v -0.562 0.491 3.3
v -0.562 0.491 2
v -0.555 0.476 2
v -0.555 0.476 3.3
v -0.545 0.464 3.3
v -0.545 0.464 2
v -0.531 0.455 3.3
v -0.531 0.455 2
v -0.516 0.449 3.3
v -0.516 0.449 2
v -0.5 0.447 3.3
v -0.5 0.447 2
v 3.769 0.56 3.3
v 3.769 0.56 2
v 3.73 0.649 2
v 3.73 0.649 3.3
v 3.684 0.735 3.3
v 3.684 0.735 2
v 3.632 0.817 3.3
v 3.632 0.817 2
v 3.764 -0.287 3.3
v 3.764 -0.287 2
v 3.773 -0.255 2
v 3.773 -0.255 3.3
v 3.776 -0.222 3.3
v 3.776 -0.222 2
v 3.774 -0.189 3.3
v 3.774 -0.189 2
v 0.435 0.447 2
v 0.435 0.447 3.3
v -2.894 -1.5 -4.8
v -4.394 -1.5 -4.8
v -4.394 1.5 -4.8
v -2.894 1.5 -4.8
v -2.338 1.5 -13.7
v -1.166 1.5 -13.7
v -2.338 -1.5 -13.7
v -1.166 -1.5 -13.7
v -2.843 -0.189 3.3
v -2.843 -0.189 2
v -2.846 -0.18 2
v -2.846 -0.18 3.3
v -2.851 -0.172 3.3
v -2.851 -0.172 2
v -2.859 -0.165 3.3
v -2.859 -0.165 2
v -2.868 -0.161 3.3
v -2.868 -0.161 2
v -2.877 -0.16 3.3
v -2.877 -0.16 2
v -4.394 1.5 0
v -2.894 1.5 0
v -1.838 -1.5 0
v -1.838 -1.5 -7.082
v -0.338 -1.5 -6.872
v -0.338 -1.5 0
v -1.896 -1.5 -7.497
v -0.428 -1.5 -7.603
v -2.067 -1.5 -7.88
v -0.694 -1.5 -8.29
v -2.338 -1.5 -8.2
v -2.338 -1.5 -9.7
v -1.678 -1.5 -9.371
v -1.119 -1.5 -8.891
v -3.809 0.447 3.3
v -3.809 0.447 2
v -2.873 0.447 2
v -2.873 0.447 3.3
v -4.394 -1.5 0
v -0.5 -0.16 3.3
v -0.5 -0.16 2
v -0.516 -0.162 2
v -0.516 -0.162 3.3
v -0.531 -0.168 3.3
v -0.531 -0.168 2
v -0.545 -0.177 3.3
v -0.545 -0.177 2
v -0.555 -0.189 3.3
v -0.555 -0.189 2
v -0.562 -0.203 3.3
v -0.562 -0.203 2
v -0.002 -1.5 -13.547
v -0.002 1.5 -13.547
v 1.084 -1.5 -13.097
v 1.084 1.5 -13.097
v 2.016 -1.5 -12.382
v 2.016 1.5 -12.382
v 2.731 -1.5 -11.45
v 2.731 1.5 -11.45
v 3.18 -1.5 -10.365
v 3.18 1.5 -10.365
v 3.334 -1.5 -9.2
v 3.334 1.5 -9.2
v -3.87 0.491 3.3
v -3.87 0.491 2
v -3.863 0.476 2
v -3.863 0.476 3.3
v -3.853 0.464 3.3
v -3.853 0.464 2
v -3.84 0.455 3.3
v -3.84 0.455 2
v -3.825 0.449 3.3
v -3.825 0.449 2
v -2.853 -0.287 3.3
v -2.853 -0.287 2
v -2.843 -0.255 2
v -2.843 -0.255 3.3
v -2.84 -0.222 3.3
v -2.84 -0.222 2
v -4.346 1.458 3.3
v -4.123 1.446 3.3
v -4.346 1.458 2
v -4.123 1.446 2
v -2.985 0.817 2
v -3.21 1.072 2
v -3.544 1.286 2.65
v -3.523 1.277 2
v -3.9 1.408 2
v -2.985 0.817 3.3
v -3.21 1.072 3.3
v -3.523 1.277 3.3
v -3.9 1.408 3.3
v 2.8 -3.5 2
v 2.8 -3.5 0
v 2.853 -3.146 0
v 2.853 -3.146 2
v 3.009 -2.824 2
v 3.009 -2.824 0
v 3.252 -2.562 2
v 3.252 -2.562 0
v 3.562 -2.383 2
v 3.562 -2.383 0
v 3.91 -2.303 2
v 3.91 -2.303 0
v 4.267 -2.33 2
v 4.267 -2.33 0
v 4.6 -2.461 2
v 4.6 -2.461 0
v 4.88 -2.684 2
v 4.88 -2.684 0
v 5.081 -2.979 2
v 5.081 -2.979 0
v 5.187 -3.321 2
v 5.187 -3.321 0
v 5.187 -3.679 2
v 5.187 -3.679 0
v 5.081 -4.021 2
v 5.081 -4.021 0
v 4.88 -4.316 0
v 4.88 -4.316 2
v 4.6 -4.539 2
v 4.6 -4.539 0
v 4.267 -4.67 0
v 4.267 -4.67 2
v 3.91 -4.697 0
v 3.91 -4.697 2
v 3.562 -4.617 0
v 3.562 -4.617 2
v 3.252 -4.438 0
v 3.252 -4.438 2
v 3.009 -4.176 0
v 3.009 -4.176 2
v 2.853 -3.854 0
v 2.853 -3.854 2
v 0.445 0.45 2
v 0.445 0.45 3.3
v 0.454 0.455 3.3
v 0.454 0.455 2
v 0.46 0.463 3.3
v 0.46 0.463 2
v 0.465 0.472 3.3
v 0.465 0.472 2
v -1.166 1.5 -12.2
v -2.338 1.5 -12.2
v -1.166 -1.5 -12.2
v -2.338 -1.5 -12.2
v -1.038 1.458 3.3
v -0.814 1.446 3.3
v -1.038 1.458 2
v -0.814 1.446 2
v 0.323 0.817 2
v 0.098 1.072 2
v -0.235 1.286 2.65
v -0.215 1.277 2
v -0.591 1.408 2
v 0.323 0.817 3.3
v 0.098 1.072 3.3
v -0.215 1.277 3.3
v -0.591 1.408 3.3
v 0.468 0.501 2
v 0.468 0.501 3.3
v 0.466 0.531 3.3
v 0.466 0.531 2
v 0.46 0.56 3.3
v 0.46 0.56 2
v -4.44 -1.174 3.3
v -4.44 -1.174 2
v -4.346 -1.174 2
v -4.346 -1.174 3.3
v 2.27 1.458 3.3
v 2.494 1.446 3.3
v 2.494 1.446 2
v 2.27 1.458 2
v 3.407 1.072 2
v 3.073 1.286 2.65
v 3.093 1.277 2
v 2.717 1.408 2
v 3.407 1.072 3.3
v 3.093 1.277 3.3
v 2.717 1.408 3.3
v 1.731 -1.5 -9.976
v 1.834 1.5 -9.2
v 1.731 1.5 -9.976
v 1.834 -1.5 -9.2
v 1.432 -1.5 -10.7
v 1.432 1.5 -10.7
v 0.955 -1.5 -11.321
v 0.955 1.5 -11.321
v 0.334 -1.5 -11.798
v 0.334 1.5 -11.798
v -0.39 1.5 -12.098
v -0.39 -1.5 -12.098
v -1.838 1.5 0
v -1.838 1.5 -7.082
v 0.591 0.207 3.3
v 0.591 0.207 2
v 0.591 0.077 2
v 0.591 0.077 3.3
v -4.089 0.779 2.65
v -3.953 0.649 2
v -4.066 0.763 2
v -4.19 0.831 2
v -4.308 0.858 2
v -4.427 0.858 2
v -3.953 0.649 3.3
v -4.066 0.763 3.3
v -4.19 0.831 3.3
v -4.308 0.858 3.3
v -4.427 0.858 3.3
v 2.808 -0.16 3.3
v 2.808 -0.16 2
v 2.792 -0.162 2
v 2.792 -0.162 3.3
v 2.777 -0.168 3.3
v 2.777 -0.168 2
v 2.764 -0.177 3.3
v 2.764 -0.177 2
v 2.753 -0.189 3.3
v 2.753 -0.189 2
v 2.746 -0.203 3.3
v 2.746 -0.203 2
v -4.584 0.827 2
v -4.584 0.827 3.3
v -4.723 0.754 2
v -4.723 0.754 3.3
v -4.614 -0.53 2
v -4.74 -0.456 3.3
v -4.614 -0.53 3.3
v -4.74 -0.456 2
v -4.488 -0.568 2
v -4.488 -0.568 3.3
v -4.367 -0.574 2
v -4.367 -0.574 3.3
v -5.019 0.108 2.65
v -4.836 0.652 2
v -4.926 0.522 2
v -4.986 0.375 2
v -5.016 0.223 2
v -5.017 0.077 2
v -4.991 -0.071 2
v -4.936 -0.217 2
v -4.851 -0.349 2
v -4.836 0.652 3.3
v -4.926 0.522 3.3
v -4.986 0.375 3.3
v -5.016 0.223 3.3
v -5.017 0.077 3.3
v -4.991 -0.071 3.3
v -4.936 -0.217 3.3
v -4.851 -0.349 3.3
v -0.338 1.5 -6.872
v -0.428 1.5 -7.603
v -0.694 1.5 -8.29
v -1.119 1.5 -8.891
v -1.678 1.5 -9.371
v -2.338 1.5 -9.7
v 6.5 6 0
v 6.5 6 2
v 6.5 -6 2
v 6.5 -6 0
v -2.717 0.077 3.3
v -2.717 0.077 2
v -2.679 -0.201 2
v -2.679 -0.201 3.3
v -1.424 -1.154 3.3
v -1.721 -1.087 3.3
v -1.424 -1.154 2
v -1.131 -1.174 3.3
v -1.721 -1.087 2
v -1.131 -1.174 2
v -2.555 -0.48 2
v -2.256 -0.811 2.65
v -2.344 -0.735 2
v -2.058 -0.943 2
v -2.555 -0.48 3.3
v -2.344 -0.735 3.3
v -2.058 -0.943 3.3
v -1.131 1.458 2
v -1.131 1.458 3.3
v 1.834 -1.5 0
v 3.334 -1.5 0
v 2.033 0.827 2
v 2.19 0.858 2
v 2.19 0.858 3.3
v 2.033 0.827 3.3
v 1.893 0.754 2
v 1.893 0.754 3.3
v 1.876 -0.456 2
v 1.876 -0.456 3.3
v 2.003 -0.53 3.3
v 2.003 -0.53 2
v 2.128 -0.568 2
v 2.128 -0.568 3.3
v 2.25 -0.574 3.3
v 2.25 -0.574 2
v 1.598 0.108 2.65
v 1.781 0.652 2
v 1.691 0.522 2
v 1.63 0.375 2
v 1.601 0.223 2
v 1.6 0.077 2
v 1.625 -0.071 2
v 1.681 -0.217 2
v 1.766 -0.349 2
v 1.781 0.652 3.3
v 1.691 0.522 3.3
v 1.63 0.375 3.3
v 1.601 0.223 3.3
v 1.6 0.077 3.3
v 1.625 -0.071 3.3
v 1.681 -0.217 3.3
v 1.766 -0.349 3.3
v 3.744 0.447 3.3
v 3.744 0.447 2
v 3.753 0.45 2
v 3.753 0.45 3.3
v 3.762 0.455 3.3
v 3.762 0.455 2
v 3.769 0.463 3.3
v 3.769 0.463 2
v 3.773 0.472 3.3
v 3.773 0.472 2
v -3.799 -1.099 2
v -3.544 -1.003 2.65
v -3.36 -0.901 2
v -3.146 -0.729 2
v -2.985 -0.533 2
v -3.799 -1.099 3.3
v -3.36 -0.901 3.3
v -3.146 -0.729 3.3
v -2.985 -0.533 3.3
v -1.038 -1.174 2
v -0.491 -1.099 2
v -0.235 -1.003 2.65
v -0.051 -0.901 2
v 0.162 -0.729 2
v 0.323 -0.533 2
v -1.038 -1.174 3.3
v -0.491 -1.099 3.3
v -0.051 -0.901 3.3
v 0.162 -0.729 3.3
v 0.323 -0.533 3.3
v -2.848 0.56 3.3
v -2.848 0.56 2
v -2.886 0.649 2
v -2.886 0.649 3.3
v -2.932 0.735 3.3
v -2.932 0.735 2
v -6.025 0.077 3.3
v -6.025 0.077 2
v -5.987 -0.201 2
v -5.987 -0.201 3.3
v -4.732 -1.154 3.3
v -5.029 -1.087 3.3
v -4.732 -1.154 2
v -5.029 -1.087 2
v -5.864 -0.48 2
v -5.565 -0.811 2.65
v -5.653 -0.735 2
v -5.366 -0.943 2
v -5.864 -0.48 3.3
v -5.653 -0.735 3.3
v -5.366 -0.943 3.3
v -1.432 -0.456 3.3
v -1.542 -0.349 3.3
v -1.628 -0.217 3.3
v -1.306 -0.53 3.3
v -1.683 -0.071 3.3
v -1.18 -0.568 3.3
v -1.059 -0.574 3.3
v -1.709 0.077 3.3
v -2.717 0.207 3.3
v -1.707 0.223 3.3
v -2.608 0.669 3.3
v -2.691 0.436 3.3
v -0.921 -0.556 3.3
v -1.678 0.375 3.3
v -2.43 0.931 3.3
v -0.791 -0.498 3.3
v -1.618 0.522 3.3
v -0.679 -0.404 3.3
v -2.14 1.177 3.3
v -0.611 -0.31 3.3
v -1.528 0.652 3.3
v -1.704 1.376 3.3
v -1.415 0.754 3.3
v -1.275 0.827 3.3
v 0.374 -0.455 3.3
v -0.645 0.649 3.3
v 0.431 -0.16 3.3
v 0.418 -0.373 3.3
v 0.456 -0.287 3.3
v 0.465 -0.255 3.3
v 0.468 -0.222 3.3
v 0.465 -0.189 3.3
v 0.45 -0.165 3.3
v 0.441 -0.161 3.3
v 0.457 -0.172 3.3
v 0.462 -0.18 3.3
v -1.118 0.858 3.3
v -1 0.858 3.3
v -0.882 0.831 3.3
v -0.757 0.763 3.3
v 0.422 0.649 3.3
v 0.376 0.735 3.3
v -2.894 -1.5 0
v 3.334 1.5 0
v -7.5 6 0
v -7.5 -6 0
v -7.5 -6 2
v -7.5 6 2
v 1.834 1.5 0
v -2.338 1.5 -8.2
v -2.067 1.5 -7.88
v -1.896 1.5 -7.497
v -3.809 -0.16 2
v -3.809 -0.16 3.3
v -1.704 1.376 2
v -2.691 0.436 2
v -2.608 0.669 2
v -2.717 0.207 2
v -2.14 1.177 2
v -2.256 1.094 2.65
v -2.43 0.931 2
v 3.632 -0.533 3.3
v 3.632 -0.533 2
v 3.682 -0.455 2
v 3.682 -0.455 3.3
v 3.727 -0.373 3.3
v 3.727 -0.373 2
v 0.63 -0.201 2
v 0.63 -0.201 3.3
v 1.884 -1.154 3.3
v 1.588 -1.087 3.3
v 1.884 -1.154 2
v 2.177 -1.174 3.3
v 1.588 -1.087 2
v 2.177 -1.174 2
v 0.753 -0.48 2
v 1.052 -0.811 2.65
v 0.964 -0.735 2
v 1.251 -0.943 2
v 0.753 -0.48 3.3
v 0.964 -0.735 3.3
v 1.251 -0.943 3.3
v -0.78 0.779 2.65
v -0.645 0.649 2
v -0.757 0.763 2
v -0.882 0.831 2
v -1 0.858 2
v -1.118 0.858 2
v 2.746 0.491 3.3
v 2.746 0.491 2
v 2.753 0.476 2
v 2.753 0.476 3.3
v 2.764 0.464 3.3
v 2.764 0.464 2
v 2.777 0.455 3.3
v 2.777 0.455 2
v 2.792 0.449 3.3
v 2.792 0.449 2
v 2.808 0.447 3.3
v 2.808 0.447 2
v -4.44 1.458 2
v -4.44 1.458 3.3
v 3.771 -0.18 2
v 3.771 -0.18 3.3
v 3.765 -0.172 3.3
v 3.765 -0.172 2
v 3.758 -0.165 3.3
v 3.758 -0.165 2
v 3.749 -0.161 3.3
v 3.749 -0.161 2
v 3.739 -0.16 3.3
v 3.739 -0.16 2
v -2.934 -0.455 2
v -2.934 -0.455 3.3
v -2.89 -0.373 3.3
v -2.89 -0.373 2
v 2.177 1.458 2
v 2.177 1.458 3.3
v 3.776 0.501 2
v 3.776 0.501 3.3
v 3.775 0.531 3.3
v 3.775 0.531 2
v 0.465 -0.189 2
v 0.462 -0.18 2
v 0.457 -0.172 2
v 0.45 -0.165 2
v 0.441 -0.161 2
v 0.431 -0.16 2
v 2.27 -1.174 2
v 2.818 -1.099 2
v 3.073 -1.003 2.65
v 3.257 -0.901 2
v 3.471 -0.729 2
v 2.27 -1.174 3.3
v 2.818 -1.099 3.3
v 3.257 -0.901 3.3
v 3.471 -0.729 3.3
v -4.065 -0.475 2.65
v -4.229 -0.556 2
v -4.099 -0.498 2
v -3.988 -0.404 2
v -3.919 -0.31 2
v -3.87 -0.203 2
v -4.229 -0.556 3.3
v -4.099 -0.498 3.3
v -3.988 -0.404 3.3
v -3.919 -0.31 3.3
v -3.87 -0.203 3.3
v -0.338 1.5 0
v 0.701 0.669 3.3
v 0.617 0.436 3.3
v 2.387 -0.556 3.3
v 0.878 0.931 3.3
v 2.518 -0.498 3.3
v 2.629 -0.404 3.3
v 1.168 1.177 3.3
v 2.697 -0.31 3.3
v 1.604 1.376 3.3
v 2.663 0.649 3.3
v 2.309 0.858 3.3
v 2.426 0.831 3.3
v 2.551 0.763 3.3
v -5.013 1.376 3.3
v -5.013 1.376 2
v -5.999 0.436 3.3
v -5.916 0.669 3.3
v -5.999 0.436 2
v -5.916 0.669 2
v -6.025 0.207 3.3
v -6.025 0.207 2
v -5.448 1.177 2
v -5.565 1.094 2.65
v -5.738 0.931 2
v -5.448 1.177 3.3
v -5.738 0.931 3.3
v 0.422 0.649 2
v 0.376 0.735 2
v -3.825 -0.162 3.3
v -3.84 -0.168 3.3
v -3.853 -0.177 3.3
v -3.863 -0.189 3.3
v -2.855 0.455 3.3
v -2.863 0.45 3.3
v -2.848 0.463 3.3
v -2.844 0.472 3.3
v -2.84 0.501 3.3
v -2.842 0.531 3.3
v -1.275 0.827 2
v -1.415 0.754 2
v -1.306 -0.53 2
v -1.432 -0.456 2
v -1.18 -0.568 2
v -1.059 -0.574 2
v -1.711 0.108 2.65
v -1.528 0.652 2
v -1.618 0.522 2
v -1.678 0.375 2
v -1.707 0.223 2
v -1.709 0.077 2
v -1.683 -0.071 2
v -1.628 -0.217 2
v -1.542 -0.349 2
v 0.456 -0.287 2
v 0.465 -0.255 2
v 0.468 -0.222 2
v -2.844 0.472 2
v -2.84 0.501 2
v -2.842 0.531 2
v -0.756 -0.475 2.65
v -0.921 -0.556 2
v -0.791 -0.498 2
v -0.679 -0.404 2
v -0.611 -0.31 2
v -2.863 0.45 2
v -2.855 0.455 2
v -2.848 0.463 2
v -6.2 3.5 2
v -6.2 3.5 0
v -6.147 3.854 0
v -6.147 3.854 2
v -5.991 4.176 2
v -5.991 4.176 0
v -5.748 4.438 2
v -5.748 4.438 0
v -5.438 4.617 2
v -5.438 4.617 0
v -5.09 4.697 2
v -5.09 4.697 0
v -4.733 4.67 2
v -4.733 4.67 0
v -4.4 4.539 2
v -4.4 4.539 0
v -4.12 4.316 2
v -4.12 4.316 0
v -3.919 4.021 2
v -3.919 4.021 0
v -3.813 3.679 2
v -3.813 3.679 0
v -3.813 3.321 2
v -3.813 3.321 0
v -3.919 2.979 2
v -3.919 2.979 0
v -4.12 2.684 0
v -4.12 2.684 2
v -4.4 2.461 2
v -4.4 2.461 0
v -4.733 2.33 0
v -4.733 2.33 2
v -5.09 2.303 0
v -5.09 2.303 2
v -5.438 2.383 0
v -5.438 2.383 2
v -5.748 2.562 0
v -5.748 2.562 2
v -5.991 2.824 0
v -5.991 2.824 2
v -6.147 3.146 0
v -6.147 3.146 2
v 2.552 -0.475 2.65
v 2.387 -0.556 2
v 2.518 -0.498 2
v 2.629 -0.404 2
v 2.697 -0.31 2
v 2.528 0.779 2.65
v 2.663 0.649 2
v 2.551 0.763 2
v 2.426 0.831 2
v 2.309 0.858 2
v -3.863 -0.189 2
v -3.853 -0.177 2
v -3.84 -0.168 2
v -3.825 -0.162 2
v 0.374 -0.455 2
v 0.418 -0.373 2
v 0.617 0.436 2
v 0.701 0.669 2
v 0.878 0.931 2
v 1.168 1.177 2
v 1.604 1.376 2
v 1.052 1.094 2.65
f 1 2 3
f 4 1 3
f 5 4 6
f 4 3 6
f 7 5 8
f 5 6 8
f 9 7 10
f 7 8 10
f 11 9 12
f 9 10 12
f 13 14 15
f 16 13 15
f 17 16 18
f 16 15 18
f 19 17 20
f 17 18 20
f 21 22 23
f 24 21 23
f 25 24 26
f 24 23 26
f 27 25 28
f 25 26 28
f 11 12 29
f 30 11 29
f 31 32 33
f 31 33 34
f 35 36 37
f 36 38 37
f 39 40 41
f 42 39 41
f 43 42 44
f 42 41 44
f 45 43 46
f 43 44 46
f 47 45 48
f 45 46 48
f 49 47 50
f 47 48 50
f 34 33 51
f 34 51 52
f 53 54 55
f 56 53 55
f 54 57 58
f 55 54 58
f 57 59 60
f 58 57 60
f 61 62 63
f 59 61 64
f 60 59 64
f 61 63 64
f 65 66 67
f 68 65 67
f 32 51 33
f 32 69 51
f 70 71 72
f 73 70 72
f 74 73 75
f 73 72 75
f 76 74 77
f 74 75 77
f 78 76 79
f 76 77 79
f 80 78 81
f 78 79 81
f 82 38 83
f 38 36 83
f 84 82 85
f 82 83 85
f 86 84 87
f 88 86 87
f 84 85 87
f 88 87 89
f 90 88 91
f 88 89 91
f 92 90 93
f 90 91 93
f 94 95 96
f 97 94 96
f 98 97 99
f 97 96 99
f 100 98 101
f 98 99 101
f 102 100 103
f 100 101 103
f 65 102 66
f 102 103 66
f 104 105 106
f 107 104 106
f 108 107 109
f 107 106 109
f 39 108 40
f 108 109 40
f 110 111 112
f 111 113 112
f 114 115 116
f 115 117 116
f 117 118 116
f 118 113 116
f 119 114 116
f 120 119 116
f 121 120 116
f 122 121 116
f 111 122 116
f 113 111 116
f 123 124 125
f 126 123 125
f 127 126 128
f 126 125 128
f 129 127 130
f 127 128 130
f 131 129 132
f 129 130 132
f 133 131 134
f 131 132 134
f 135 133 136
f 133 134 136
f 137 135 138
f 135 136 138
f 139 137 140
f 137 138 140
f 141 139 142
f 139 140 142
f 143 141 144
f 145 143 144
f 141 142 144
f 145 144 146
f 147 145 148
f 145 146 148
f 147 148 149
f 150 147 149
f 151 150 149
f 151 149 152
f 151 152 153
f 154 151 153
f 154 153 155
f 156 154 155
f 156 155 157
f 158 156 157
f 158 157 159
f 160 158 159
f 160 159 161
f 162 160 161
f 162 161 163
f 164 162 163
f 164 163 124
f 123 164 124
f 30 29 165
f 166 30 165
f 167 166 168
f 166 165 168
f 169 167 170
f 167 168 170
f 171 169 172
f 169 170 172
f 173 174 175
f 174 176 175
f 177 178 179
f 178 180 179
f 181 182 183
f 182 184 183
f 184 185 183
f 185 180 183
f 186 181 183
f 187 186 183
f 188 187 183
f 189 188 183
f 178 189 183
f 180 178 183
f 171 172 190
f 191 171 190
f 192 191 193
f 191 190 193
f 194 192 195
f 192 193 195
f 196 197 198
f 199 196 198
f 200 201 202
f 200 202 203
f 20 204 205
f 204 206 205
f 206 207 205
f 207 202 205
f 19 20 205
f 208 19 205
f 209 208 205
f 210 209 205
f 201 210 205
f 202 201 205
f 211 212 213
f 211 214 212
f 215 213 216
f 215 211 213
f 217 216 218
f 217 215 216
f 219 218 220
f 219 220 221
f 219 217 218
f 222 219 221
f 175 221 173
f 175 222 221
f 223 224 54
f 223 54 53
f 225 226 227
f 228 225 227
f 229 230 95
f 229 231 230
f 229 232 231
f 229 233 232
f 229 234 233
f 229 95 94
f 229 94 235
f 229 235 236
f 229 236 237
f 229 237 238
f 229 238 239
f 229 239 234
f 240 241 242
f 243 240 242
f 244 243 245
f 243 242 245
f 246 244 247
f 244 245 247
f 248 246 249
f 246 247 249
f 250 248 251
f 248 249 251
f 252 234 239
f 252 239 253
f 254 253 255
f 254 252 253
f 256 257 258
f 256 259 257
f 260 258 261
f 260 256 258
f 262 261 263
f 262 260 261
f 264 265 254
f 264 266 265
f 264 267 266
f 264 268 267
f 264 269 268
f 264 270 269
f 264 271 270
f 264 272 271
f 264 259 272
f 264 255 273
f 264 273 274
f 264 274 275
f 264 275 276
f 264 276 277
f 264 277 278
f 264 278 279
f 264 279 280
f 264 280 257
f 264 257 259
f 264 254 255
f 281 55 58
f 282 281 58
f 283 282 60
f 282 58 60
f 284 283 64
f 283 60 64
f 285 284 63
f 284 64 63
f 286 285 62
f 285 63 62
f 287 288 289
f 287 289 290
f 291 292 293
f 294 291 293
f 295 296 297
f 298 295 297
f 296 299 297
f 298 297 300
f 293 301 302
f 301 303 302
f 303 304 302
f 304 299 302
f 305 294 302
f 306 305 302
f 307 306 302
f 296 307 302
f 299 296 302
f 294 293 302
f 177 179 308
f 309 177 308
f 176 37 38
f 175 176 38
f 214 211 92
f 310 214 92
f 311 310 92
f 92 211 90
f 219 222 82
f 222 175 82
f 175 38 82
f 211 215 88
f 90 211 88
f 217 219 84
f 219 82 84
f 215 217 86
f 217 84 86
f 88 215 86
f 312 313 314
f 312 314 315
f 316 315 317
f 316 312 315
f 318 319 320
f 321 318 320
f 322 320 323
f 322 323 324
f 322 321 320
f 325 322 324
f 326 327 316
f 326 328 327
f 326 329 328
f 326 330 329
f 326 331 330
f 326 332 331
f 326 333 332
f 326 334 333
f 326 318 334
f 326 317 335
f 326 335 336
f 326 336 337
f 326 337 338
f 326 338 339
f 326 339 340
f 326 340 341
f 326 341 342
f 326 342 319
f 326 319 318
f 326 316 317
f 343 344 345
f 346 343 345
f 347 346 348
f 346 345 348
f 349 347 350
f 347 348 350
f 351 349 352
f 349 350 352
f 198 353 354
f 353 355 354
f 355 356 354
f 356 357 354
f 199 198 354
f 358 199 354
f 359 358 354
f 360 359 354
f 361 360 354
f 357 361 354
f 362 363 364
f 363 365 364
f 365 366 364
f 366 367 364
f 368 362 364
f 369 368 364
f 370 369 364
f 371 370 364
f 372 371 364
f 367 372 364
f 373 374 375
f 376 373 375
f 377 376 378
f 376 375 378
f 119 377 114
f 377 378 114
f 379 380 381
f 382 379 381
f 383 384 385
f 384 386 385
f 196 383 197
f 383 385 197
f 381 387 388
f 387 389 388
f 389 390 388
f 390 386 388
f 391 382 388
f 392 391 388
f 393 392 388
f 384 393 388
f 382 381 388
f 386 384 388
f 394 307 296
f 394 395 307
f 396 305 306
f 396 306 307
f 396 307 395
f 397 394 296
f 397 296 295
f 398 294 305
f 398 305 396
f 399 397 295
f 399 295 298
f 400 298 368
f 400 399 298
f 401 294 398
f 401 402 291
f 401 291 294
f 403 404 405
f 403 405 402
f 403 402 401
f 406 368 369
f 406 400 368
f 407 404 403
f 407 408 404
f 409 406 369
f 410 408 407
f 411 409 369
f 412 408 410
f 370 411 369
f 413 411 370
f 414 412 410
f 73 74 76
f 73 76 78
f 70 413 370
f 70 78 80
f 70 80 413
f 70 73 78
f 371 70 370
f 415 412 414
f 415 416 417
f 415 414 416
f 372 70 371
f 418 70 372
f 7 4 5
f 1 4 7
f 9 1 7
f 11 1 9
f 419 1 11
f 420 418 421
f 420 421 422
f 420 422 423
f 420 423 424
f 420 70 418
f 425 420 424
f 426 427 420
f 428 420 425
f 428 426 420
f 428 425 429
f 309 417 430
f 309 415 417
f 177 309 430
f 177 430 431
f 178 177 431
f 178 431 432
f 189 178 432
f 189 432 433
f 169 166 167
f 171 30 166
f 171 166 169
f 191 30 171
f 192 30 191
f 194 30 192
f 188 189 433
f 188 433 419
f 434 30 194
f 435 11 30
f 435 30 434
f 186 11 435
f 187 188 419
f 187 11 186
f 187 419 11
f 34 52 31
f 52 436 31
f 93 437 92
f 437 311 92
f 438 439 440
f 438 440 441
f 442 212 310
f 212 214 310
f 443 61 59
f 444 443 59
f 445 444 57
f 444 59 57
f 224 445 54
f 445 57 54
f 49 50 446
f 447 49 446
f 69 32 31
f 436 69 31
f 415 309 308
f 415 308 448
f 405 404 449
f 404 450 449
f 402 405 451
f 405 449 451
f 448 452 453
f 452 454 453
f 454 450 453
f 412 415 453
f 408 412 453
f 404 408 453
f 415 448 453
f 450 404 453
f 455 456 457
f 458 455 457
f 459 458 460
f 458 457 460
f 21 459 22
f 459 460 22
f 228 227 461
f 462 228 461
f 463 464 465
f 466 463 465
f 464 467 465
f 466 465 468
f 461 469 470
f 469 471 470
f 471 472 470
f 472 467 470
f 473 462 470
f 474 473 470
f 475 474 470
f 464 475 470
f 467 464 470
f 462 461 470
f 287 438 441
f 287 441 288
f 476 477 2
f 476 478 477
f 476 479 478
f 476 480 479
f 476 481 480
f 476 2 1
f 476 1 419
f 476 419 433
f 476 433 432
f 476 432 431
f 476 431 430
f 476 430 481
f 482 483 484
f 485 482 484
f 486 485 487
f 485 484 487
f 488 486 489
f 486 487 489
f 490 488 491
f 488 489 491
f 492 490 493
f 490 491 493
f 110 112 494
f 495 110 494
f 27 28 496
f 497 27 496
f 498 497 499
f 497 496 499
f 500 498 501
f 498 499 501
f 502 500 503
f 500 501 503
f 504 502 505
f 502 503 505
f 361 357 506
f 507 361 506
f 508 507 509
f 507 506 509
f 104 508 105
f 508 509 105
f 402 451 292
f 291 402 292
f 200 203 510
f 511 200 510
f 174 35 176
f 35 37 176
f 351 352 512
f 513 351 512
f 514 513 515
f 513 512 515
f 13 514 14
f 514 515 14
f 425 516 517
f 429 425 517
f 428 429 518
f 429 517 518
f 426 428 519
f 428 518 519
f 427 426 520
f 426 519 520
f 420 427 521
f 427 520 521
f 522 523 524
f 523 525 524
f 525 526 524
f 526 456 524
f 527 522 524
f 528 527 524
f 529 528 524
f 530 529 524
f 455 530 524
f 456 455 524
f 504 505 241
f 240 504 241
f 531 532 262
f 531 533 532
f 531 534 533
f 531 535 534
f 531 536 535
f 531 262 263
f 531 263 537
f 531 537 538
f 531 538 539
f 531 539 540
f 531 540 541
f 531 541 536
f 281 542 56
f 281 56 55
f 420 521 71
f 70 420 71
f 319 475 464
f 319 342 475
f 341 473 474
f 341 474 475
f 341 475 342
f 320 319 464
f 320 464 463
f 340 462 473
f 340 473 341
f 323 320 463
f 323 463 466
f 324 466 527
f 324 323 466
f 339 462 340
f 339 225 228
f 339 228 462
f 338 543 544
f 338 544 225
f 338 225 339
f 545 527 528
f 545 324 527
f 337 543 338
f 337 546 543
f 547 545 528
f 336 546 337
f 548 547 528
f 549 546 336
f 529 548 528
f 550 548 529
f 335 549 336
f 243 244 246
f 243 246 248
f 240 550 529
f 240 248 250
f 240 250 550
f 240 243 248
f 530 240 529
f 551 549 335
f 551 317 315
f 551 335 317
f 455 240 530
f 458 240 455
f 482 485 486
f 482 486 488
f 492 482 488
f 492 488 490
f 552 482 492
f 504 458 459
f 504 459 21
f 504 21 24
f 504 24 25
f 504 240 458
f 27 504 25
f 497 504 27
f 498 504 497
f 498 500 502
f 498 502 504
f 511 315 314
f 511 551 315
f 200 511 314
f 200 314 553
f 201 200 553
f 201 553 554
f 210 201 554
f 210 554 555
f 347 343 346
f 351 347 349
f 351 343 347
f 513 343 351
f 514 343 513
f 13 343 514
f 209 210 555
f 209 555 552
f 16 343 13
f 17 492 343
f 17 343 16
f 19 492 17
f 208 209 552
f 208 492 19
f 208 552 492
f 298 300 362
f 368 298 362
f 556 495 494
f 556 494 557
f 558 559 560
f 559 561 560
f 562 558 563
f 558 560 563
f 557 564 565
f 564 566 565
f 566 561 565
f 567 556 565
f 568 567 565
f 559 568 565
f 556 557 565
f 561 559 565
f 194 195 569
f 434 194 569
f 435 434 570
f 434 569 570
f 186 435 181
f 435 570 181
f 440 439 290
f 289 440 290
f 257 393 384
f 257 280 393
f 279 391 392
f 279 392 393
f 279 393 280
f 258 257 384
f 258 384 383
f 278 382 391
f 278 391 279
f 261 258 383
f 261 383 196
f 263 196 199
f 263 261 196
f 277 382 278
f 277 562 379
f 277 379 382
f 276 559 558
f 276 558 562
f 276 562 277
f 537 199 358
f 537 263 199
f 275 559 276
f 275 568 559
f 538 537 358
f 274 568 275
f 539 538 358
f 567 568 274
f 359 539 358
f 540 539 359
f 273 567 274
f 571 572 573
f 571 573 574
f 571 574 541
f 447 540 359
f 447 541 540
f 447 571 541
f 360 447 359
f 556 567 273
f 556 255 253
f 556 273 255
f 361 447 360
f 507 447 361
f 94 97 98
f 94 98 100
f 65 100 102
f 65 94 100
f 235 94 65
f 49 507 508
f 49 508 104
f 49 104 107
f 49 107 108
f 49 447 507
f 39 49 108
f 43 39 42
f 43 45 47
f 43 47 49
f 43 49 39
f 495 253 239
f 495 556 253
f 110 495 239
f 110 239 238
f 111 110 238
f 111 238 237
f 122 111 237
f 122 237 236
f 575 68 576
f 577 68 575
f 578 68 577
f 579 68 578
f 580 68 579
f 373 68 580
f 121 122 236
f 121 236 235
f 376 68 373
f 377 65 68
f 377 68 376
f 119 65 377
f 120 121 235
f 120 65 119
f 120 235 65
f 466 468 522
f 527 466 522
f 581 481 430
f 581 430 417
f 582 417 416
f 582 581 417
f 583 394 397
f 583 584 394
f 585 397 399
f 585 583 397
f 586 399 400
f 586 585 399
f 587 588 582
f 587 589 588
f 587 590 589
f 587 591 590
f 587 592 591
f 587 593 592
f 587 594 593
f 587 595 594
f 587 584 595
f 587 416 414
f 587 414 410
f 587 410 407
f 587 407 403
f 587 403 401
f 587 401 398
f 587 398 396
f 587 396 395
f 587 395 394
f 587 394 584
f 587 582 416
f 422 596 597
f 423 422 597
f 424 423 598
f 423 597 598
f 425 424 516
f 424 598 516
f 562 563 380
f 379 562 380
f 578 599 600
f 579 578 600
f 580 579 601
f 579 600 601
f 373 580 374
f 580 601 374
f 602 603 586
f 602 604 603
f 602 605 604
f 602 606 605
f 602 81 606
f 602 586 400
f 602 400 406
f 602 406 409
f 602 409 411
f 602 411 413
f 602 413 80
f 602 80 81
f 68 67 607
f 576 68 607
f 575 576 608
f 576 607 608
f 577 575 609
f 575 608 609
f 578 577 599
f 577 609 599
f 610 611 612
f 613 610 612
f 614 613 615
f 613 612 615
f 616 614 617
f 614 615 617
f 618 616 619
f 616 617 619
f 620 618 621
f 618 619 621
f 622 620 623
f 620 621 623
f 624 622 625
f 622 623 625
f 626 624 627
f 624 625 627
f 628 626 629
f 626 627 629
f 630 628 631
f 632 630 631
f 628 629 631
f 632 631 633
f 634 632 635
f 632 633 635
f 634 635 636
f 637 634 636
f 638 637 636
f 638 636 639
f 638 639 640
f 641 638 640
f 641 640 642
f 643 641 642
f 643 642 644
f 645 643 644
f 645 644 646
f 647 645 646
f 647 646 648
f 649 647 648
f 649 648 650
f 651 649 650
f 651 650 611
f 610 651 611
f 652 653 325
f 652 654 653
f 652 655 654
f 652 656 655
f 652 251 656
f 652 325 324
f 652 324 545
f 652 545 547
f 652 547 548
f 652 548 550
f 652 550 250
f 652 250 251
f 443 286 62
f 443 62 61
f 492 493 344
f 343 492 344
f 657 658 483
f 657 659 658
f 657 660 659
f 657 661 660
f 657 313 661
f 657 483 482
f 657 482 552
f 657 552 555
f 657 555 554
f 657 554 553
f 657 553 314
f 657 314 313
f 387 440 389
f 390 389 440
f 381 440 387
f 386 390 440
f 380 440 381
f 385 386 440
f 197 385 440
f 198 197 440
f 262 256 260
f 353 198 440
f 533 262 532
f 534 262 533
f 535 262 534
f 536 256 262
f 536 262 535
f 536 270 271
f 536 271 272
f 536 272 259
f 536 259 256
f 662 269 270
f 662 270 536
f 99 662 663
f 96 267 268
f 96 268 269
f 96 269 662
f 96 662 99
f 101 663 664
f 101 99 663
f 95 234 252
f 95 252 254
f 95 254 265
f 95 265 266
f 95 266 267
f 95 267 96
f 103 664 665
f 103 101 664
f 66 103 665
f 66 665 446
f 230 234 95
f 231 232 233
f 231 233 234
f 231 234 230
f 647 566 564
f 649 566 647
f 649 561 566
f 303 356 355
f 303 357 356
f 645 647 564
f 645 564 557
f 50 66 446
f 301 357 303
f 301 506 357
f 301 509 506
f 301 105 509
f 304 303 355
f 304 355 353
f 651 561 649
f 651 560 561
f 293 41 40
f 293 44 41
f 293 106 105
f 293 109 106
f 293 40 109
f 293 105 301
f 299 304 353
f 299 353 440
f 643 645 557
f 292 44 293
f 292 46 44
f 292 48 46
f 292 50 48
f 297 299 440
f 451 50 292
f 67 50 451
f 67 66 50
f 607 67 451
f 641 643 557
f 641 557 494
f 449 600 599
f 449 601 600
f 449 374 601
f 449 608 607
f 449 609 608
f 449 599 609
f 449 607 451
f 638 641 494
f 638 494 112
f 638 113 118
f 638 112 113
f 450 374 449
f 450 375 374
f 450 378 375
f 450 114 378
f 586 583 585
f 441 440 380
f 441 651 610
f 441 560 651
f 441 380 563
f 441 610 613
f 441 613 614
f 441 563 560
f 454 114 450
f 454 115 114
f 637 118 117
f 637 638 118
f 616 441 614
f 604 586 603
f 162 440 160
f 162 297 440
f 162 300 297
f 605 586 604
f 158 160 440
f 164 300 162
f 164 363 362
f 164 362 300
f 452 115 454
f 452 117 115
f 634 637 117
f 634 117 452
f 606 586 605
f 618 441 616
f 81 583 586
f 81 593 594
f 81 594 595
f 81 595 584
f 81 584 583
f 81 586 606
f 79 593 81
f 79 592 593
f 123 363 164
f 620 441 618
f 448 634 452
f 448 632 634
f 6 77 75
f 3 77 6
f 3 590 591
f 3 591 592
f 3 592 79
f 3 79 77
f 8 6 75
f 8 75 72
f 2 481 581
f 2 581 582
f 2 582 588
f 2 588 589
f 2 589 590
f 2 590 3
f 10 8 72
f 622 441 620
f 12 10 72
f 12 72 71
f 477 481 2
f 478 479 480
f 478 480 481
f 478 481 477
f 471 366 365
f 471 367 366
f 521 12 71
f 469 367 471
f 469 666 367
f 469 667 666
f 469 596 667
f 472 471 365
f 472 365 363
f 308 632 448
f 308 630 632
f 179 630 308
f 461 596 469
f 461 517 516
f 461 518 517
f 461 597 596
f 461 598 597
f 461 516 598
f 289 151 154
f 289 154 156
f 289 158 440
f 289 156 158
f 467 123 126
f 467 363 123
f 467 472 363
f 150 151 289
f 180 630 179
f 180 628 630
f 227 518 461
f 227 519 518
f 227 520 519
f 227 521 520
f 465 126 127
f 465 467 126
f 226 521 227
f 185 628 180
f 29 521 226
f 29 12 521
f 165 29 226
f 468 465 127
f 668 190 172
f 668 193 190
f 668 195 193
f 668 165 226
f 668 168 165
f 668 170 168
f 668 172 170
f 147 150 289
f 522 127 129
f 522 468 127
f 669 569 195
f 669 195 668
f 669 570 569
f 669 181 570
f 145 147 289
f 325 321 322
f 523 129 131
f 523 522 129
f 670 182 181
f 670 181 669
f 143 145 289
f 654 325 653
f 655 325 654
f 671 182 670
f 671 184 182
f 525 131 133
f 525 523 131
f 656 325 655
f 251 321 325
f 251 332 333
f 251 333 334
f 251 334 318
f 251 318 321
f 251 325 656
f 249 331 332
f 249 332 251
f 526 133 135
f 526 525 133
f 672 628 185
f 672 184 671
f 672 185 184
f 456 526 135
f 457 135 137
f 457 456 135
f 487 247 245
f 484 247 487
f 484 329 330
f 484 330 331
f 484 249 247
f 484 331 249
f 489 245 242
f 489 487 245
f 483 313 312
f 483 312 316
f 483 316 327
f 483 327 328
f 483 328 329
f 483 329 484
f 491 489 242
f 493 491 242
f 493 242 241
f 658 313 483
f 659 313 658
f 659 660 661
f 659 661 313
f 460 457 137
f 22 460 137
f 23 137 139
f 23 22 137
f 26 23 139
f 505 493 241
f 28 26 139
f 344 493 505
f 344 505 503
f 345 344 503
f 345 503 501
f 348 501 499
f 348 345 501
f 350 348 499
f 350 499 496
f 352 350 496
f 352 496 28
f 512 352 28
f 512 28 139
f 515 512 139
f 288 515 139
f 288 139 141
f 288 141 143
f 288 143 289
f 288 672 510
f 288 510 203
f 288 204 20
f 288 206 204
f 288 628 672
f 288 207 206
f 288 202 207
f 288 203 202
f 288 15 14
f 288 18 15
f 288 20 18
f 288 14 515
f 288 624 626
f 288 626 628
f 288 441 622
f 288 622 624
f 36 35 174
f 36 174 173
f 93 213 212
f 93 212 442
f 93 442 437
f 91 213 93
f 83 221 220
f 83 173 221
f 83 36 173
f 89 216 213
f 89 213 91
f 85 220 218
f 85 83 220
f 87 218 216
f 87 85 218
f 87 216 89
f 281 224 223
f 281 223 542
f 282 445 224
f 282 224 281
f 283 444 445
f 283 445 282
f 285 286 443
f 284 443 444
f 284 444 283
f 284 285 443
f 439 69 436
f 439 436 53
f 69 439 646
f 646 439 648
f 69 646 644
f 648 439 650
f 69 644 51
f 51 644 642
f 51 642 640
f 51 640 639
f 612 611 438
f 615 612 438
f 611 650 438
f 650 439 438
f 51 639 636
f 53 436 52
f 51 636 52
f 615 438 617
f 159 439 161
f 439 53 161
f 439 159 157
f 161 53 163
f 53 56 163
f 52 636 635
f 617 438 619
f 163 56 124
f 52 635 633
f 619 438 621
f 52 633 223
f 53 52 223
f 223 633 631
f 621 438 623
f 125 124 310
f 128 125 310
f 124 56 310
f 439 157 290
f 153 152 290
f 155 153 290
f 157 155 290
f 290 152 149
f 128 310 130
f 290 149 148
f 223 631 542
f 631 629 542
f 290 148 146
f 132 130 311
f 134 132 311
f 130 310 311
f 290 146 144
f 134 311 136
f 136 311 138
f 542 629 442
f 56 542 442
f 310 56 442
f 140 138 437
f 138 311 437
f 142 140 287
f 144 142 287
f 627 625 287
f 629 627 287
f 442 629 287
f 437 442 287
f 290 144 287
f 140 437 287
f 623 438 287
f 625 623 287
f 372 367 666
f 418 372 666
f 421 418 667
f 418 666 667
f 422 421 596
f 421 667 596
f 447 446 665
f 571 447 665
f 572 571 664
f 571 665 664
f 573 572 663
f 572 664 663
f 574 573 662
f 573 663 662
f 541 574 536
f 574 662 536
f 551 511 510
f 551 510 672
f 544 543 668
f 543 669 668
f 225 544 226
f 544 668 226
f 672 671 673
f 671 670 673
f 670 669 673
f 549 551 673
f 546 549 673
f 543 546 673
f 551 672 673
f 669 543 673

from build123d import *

# Parameters (mm, degrees)
SKETCH1_W           = 15
SKETCH1_H           = 12
BOSS_EXTRUDE1_DEPTH = 2
BOSS_EXTRUDE2_DEPTH = 2
SKETCH3_W           = 1.5
SKETCH3_H           = 4.8
BOSS_EXTRUDE3_DEPTH = 1.5
FILLET3_START       = -1.5
FILLET3_DEPTH       = 3
FILLET4_R           = 3
FILLET5_R           = 3
FILLET6_R           = 4.5
SKETCH4_W           = 2
SKETCH4_H           = 12
CUT_EXTRUDE1_DEPTH  = 1
SKETCH5_R           = 1.2
CUT_EXTRUDE2_DEPTH  = 17.731407672
CUT_EXTRUDE3_START  = -0.7
CUT_EXTRUDE3_DEPTH  = 0.7


with BuildPart() as part:
    # Sketch1 → Boss-Extrude1 (new body)
    with BuildSketch(Plane.XY):
        Rectangle(SKETCH1_W, SKETCH1_H)
    extrude(amount=BOSS_EXTRUDE1_DEPTH)

    # Sketch2 → Boss-Extrude2 (add)
    with BuildSketch(Plane.XY.offset(2)):
        with BuildLine():
            Line((-0.500488048, 0.447210694), (0.435347045, 0.447210694))
            ThreePointArc((0.435347045, 0.447210694), (0.453657173, 0.45529852), (0.464590943, 0.472065344))
            ThreePointArc((0.464590943, 0.472065344), (0.467777397, 0.516057125), (0.460402384, 0.559543208))
            ThreePointArc((0.460402384, 0.559543208), (0.399954535, 0.692528449), (0.323240273, 0.816842321))
            add(Edge.make_bspline(
                [(0.323240273, 0.816842321), (-0.095057279, 1.457976678), (-1.037858727, 1.457976694)],
                knots=[0.342748392, 0.342748392, 0.342748392, 1.381331674, 1.381331674, 1.381331674], degree=2, weights=[1, 0.868170932, 1]))
            Line((-1.037858727, 1.457976694), (-1.131479815, 1.457976694))
            add(Edge.make_bspline(
                [(-1.131479815, 1.457976694), (-2.717136663, 1.457976694), (-2.717136676, 0.206821629)],
                knots=[4.81203319, 4.81203319, 4.81203319, 6.344970318, 6.344970318, 6.344970318], degree=2, weights=[1, 0.720364545, 1]))
            Line((-2.717136676, 0.206821629), (-2.717136676, 0.076691364))
            add(Edge.make_bspline(
                [(-2.717136676, 0.076691364), (-2.717136676, -1.174463735), (-1.131479784, -1.174463712)],
                knots=[3.079807634, 3.079807634, 3.079807634, 4.61274479, 4.61274479, 4.61274479], degree=2, weights=[1, 0.720364535, 1]))
            Line((-1.131479784, -1.174463712), (-1.037858761, -1.174463712))
            add(Edge.make_bspline(
                [(-1.037858761, -1.174463712), (-0.095057289, -1.174463712), (0.323240273, -0.533329339)],
                knots=[1.760260959, 1.760260959, 1.760260959, 2.798844261, 2.798844261, 2.798844261], degree=2, weights=[1, 0.868170926, 1]))
            ThreePointArc((0.323240273, -0.533329339), (0.396990367, -0.414226505), (0.455654338, -0.287013692))
            ThreePointArc((0.455654338, -0.287013692), (0.467247325, -0.238690378), (0.465485217, -0.189027163))
            ThreePointArc((0.465485217, -0.189027163), (0.453480667, -0.168104183), (0.430820669, -0.159833461))
            Line((0.430820669, -0.159833461), (-0.50048808, -0.159833461))
            ThreePointArc((-0.50048808, -0.159833461), (-0.53825591, -0.17183426), (-0.562169449, -0.203434431))
            add(Edge.make_bspline(
                [(-1.058661028, -0.574317984), (-0.693553117, -0.574677188), (-0.562169449, -0.203434431)],
                knots=[5.955155363, 5.955155363, 5.955155363, 7.020735544, 7.020735544, 7.020735544], degree=2, weights=[1, 0.86139323, 1]))
            add(Edge.make_bspline(
                [(-1.118454184, 0.858318186), (-1.740543918, 0.826860552), (-1.710558048, 0.108403064), (-1.680572179, -0.610054424), (-1.058661028, -0.574317984)],
                knots=[3.181025595, 3.181025595, 3.181025595, 4.754799698, 4.754799698, 6.328573801, 6.328573801, 6.328573801], degree=2, weights=[1, 0.706053195, 1, 0.706053195, 1]))
            add(Edge.make_bspline(
                [(-0.562169449, 0.490811684), (-0.70840827, 0.904029734), (-1.118454184, 0.858318186)],
                knots=[2.404042417, 2.404042417, 2.404042417, 3.565685694, 3.565685694, 3.565685694], degree=2, weights=[1, 0.83601209, 1]))
            ThreePointArc((-0.562169449, 0.490811684), (-0.538255894, 0.459211502), (-0.500488048, 0.447210694))
        make_face()
        with BuildLine():
            Line((-3.808792647, 0.447210694), (-2.872957501, 0.447210694))
            ThreePointArc((-2.872957501, 0.447210694), (-2.854647373, 0.45529852), (-2.843713602, 0.472065344))
            ThreePointArc((-2.843713602, 0.472065344), (-2.840527149, 0.516057125), (-2.847902161, 0.559543208))
            ThreePointArc((-2.847902161, 0.559543208), (-2.90835001, 0.692528449), (-2.985064272, 0.816842321))
            add(Edge.make_bspline(
                [(-2.985064272, 0.816842321), (-3.403361825, 1.457976679), (-4.346163273, 1.457976694)],
                knots=[0.342748392, 0.342748392, 0.342748392, 1.381331674, 1.381331674, 1.381331674], degree=2, weights=[1, 0.868170932, 1]))
            Line((-4.346163273, 1.457976694), (-4.43978436, 1.457976694))
            add(Edge.make_bspline(
                [(-4.43978436, 1.457976694), (-6.025441208, 1.457976694), (-6.025441222, 0.206821629)],
                knots=[4.81203319, 4.81203319, 4.81203319, 6.344970318, 6.344970318, 6.344970318], degree=2, weights=[1, 0.720364545, 1]))
            Line((-6.025441222, 0.206821629), (-6.025441222, 0.076691364))
            add(Edge.make_bspline(
                [(-6.025441222, 0.076691364), (-6.025441222, -1.174463735), (-4.439784331, -1.174463712)],
                knots=[6.221400287, 6.221400287, 6.221400287, 7.754337442, 7.754337442, 7.754337442], degree=2, weights=[1, 0.720364536, 1]))
            Line((-4.439784331, -1.174463712), (-4.346163307, -1.174463712))
            add(Edge.make_bspline(
                [(-4.346163307, -1.174463712), (-3.403361835, -1.174463712), (-2.985064272, -0.533329339)],
                knots=[1.760260959, 1.760260959, 1.760260959, 2.798844261, 2.798844261, 2.798844261], degree=2, weights=[1, 0.868170926, 1]))
            ThreePointArc((-2.985064272, -0.533329339), (-2.911314179, -0.414226505), (-2.852650208, -0.287013692))
            ThreePointArc((-2.852650208, -0.287013692), (-2.84105722, -0.238690378), (-2.842819329, -0.189027163))
            ThreePointArc((-2.842819329, -0.189027163), (-2.854823879, -0.168104182), (-2.877483878, -0.159833461))
            Line((-2.877483878, -0.159833461), (-3.808792626, -0.159833461))
            ThreePointArc((-3.808792626, -0.159833461), (-3.846560455, -0.17183426), (-3.870473995, -0.203434431))
            add(Edge.make_bspline(
                [(-4.366965573, -0.574317984), (-4.001857663, -0.574677188), (-3.870473995, -0.203434431)],
                knots=[2.81356271, 2.81356271, 2.81356271, 3.87914289, 3.87914289, 3.87914289], degree=2, weights=[1, 0.86139323, 1]))
            add(Edge.make_bspline(
                [(-4.42675873, 0.858318186), (-5.048848463, 0.826860552), (-5.018862594, 0.108403064), (-4.988876725, -0.610054424), (-4.366965573, -0.574317984)],
                knots=[3.181025595, 3.181025595, 3.181025595, 4.754799698, 4.754799698, 6.328573801, 6.328573801, 6.328573801], degree=2, weights=[1, 0.706053195, 1, 0.706053195, 1]))
            add(Edge.make_bspline(
                [(-3.870473995, 0.490811684), (-4.016712815, 0.904029734), (-4.42675873, 0.858318186)],
                knots=[5.54563507, 5.54563507, 5.54563507, 6.707278348, 6.707278348, 6.707278348], degree=2, weights=[1, 0.83601209, 1]))
            ThreePointArc((-3.870473995, 0.490811684), (-3.846560461, 0.459211518), (-3.808792647, 0.447210694))
        make_face()
        with BuildLine():
            Line((2.807816498, 0.447210694), (3.743651591, 0.447210694))
            ThreePointArc((3.743651591, 0.447210694), (3.761961719, 0.45529852), (3.772895489, 0.472065344))
            ThreePointArc((3.772895489, 0.472065344), (3.776081943, 0.516057125), (3.76870693, 0.559543208))
            ThreePointArc((3.76870693, 0.559543208), (3.708259081, 0.692528449), (3.631544819, 0.816842321))
            add(Edge.make_bspline(
                [(3.631544819, 0.816842321), (3.213247267, 1.457976678), (2.270445819, 1.457976694)],
                knots=[0.342748392, 0.342748392, 0.342748392, 1.381331674, 1.381331674, 1.381331674], degree=2, weights=[1, 0.868170932, 1]))
            Line((2.270445819, 1.457976694), (2.176824731, 1.457976694))
            add(Edge.make_bspline(
                [(2.176824731, 1.457976694), (0.591167883, 1.457976694), (0.59116787, 0.206821629)],
                knots=[4.81203319, 4.81203319, 4.81203319, 6.344970318, 6.344970318, 6.344970318], degree=2, weights=[1, 0.720364545, 1]))
            Line((0.59116787, 0.206821629), (0.59116787, 0.076691364))
            add(Edge.make_bspline(
                [(0.59116787, 0.076691364), (0.59116787, -1.174463735), (2.176824762, -1.174463712)],
                knots=[3.079807634, 3.079807634, 3.079807634, 4.61274479, 4.61274479, 4.61274479], degree=2, weights=[1, 0.720364535, 1]))
            Line((2.176824762, -1.174463712), (2.270445785, -1.174463712))
            add(Edge.make_bspline(
                [(2.270445785, -1.174463712), (3.213247257, -1.174463712), (3.631544819, -0.533329339)],
                knots=[1.760260959, 1.760260959, 1.760260959, 2.798844261, 2.798844261, 2.798844261], degree=2, weights=[1, 0.868170926, 1]))
            ThreePointArc((3.631544819, -0.533329339), (3.705294913, -0.414226505), (3.763958884, -0.287013692))
            ThreePointArc((3.763958884, -0.287013692), (3.775551871, -0.238690378), (3.773789763, -0.189027163))
            ThreePointArc((3.773789763, -0.189027163), (3.761785213, -0.168104183), (3.739125215, -0.159833461))
            Line((3.739125215, -0.159833461), (2.807816466, -0.159833461))
            ThreePointArc((2.807816466, -0.159833461), (2.770048636, -0.17183426), (2.746135097, -0.203434431))
            add(Edge.make_bspline(
                [(2.249643518, -0.574317984), (2.614751429, -0.574677188), (2.746135097, -0.203434431)],
                knots=[2.81356271, 2.81356271, 2.81356271, 3.87914289, 3.87914289, 3.87914289], degree=2, weights=[1, 0.86139323, 1]))
            add(Edge.make_bspline(
                [(2.189850362, 0.858318186), (1.567760628, 0.826860552), (1.597746498, 0.108403064), (1.627732367, -0.610054424), (2.249643518, -0.574317984)],
                knots=[0.039432941, 0.039432941, 0.039432941, 1.613207044, 1.613207044, 3.186981147, 3.186981147, 3.186981147], degree=2, weights=[1, 0.706053195, 1, 0.706053195, 1]))
            add(Edge.make_bspline(
                [(2.746135097, 0.490811684), (2.599896276, 0.904029734), (2.189850362, 0.858318186)],
                knots=[2.404042417, 2.404042417, 2.404042417, 3.565685694, 3.565685694, 3.565685694], degree=2, weights=[1, 0.83601209, 1]))
            ThreePointArc((2.746135097, 0.490811684), (2.770048652, 0.459211502), (2.807816498, 0.447210694))
        make_face()
    extrude(amount=BOSS_EXTRUDE2_DEPTH)

    # Sketch3 → Boss-Extrude3 (add, symmetric)
    with BuildSketch(Plane(origin=(0, 0, 0), x_dir=(1, 0, 0), z_dir=(0, 1, 0))):
        Polygon((1.833716, 0), (3.333716, 0), (3.333716, 13.7), (-2.337662633, 13.7), (-2.337662633, 12.2), (1.833716, 12.2), align=None)
        with Locations((-3.644025381, 2.4)):
            Rectangle(SKETCH3_W, SKETCH3_H)
        Polygon((-1.837662633, 0), (-0.337662633, 0), (-0.337662633, 9.7), (-2.337662633, 9.7), (-2.337662633, 8.2), (-1.837662633, 8.2), align=None)
    extrude(amount=BOSS_EXTRUDE3_DEPTH, both=True)

    # Fillet3: read off the stored shape, not the designer's step
    # Fillet3 outline → Fillet3 (add)
    with BuildSketch(Plane(origin=(0, 0, 0), x_dir=(1, 0, 0), z_dir=(0, 1, 0)).offset(FILLET3_START)):
        with BuildLine():
            Line((-1.837662633, 8.2), (-2.337662633, 8.2))
            ThreePointArc((-2.337662633, 8.2), (-1.968356239, 7.694338447), (-1.837662633, 7.081966011))
            Line((-1.837662633, 7.081966011), (-1.837662633, 8.2))
        make_face()
    extrude(amount=FILLET3_DEPTH)

    # Fillet4
    # the kernel refuses this fillet: 3 mm, written as the material it takes off along each edge
    with BuildSketch(Plane(origin=(-0.337662633, -8.571067812, -9.7), x_dir=(0, 0, 1), z_dir=(0, 1, 0))) as fillet4_piece_1:
        with BuildLine():
            CenterArc((2.828427125, -3), FILLET4_R, 90, 70.528779366)
            Line((0, -2), (-0.056568542, -1.98))
            ThreePointArc((-0.056568542, -1.98), (-0.06, -1), (-0.06, 0))
            Line((-0.06, 0), (0, 0.06))
            Line((0, 0.06), (2.828427125, 0.06))
            Line((2.828427125, 0.06), (2.828427125, 0))
        make_face()
    extrude(amount=17.142135624, mode=Mode.SUBTRACT)

    # Fillet5
    fillet5_edges = [part.edges().sort_by_distance(p)[0] for p in [
        (1.833716, 0, -12.2),
    ]]
    fillet(fillet5_edges, radius=FILLET5_R)

    # Fillet6
    fillet6_edges = [part.edges().sort_by_distance(p)[0] for p in [
        (3.333716, 0, -13.7),
    ]]
    fillet(fillet6_edges, radius=FILLET6_R)

    # Sketch4 → Cut-Extrude1 (cut)
    with BuildSketch(Plane(origin=(7.5, 0, 0), x_dir=(0, 0, -1), z_dir=(1, 0, 0))):
        with Locations((-1, 0)):
            Rectangle(SKETCH4_W, SKETCH4_H)
    extrude(amount=-CUT_EXTRUDE1_DEPTH, mode=Mode.SUBTRACT)

    # Sketch5 → Cut-Extrude2 (cut, through all)
    with BuildSketch(Plane(origin=(0, 0, 0), x_dir=(-1, 0, 0), z_dir=(0, 0, -1))):
        with Locations((-4, -3.5)):
            Circle(SKETCH5_R)
        with Locations((5, 3.5)):
            Circle(SKETCH5_R)
    extrude(amount=-CUT_EXTRUDE2_DEPTH, mode=Mode.SUBTRACT)

    # Sketch6 → Cut-Extrude3 (cut)
    with BuildSketch(Plane.XY.offset(4).offset(CUT_EXTRUDE3_START)):
        with BuildLine():
            Line((-3.808792647, 0.447210694), (-2.872957501, 0.447210694))
            ThreePointArc((-2.872957501, 0.447210694), (-2.854647373, 0.45529852), (-2.843713602, 0.472065344))
            ThreePointArc((-2.843713602, 0.472065344), (-2.840527149, 0.516057125), (-2.847902161, 0.559543208))
            ThreePointArc((-2.847902161, 0.559543208), (-2.90835001, 0.692528449), (-2.985064272, 0.816842321))
            add(Edge.make_bspline(
                [(-2.985064272, 0.816842321), (-3.403361825, 1.457976679), (-4.346163273, 1.457976694)],
                knots=[0.342748392, 0.342748392, 0.342748392, 1.381331674, 1.381331674, 1.381331674], degree=2, weights=[1, 0.868170932, 1]))
            Line((-4.346163273, 1.457976694), (-4.43978436, 1.457976694))
            add(Edge.make_bspline(
                [(-4.43978436, 1.457976694), (-6.025441208, 1.457976694), (-6.025441222, 0.206821629)],
                knots=[4.81203319, 4.81203319, 4.81203319, 6.344970318, 6.344970318, 6.344970318], degree=2, weights=[1, 0.720364545, 1]))
            Line((-6.025441222, 0.206821629), (-6.025441222, 0.076691364))
            add(Edge.make_bspline(
                [(-6.025441222, 0.076691364), (-6.025441222, -1.174463735), (-4.439784331, -1.174463712)],
                knots=[6.221400287, 6.221400287, 6.221400287, 7.754337442, 7.754337442, 7.754337442], degree=2, weights=[1, 0.720364536, 1]))
            Line((-4.439784331, -1.174463712), (-4.346163307, -1.174463712))
            add(Edge.make_bspline(
                [(-4.346163307, -1.174463712), (-3.403361835, -1.174463712), (-2.985064272, -0.533329339)],
                knots=[1.760260959, 1.760260959, 1.760260959, 2.798844261, 2.798844261, 2.798844261], degree=2, weights=[1, 0.868170926, 1]))
            ThreePointArc((-2.985064272, -0.533329339), (-2.911314179, -0.414226505), (-2.852650208, -0.287013692))
            ThreePointArc((-2.852650208, -0.287013692), (-2.84105722, -0.238690378), (-2.842819329, -0.189027163))
            ThreePointArc((-2.842819329, -0.189027163), (-2.854823879, -0.168104182), (-2.877483878, -0.159833461))
            Line((-2.877483878, -0.159833461), (-3.808792626, -0.159833461))
            ThreePointArc((-3.808792626, -0.159833461), (-3.846560455, -0.17183426), (-3.870473995, -0.203434431))
            add(Edge.make_bspline(
                [(-4.366965573, -0.574317984), (-4.001857663, -0.574677188), (-3.870473995, -0.203434431)],
                knots=[5.955155363, 5.955155363, 5.955155363, 7.020735544, 7.020735544, 7.020735544], degree=2, weights=[1, 0.86139323, 1]))
            add(Edge.make_bspline(
                [(-4.42675873, 0.858318186), (-5.048848463, 0.826860552), (-5.018862594, 0.108403064), (-4.988876725, -0.610054424), (-4.366965573, -0.574317984)],
                knots=[3.181025595, 3.181025595, 3.181025595, 4.754799698, 4.754799698, 6.328573801, 6.328573801, 6.328573801], degree=2, weights=[1, 0.706053195, 1, 0.706053195, 1]))
            add(Edge.make_bspline(
                [(-3.870473995, 0.490811684), (-4.016712815, 0.904029734), (-4.42675873, 0.858318186)],
                knots=[2.404042417, 2.404042417, 2.404042417, 3.565685694, 3.565685694, 3.565685694], degree=2, weights=[1, 0.83601209, 1]))
            ThreePointArc((-3.870473995, 0.490811684), (-3.846560461, 0.459211518), (-3.808792647, 0.447210694))
        make_face()
        with BuildLine():
            Line((-0.500488048, 0.447210694), (0.435347045, 0.447210694))
            ThreePointArc((0.435347045, 0.447210694), (0.453657173, 0.45529852), (0.464590943, 0.472065344))
            ThreePointArc((0.464590943, 0.472065344), (0.467777397, 0.516057125), (0.460402384, 0.559543208))
            ThreePointArc((0.460402384, 0.559543208), (0.399954535, 0.692528449), (0.323240273, 0.816842321))
            add(Edge.make_bspline(
                [(0.323240273, 0.816842321), (-0.095057279, 1.457976678), (-1.037858727, 1.457976694)],
                knots=[0.342748392, 0.342748392, 0.342748392, 1.381331674, 1.381331674, 1.381331674], degree=2, weights=[1, 0.868170932, 1]))
            Line((-1.037858727, 1.457976694), (-1.131479815, 1.457976694))
            add(Edge.make_bspline(
                [(-1.131479815, 1.457976694), (-2.717136663, 1.457976694), (-2.717136676, 0.206821629)],
                knots=[4.81203319, 4.81203319, 4.81203319, 6.344970318, 6.344970318, 6.344970318], degree=2, weights=[1, 0.720364545, 1]))
            Line((-2.717136676, 0.206821629), (-2.717136676, 0.076691364))
            add(Edge.make_bspline(
                [(-2.717136676, 0.076691364), (-2.717136676, -1.174463735), (-1.131479784, -1.174463712)],
                knots=[3.079807634, 3.079807634, 3.079807634, 4.61274479, 4.61274479, 4.61274479], degree=2, weights=[1, 0.720364535, 1]))
            Line((-1.131479784, -1.174463712), (-1.037858761, -1.174463712))
            add(Edge.make_bspline(
                [(-1.037858761, -1.174463712), (-0.095057289, -1.174463712), (0.323240273, -0.533329339)],
                knots=[1.760260959, 1.760260959, 1.760260959, 2.798844261, 2.798844261, 2.798844261], degree=2, weights=[1, 0.868170926, 1]))
            ThreePointArc((0.323240273, -0.533329339), (0.396990367, -0.414226505), (0.455654338, -0.287013692))
            ThreePointArc((0.455654338, -0.287013692), (0.467247325, -0.238690378), (0.465485217, -0.189027163))
            ThreePointArc((0.465485217, -0.189027163), (0.453480667, -0.168104183), (0.430820669, -0.159833461))
            Line((0.430820669, -0.159833461), (-0.50048808, -0.159833461))
            ThreePointArc((-0.50048808, -0.159833461), (-0.53825591, -0.17183426), (-0.562169449, -0.203434431))
            add(Edge.make_bspline(
                [(-1.058661028, -0.574317984), (-0.693553117, -0.574677188), (-0.562169449, -0.203434431)],
                knots=[5.955155363, 5.955155363, 5.955155363, 7.020735544, 7.020735544, 7.020735544], degree=2, weights=[1, 0.86139323, 1]))
            add(Edge.make_bspline(
                [(-1.118454184, 0.858318186), (-1.740543918, 0.826860552), (-1.710558048, 0.108403064), (-1.680572179, -0.610054424), (-1.058661028, -0.574317984)],
                knots=[3.181025595, 3.181025595, 3.181025595, 4.754799698, 4.754799698, 6.328573801, 6.328573801, 6.328573801], degree=2, weights=[1, 0.706053195, 1, 0.706053195, 1]))
            add(Edge.make_bspline(
                [(-0.562169449, 0.490811684), (-0.70840827, 0.904029734), (-1.118454184, 0.858318186)],
                knots=[2.404042417, 2.404042417, 2.404042417, 3.565685694, 3.565685694, 3.565685694], degree=2, weights=[1, 0.83601209, 1]))
            ThreePointArc((-0.562169449, 0.490811684), (-0.538255894, 0.459211502), (-0.500488048, 0.447210694))
        make_face()
        with BuildLine():
            Line((2.807816498, 0.447210694), (3.743651591, 0.447210694))
            ThreePointArc((3.743651591, 0.447210694), (3.761961719, 0.45529852), (3.772895489, 0.472065344))
            ThreePointArc((3.772895489, 0.472065344), (3.776081943, 0.516057125), (3.76870693, 0.559543208))
            ThreePointArc((3.76870693, 0.559543208), (3.708259081, 0.692528449), (3.631544819, 0.816842321))
            add(Edge.make_bspline(
                [(3.631544819, 0.816842321), (3.213247267, 1.457976678), (2.270445819, 1.457976694)],
                knots=[0.342748392, 0.342748392, 0.342748392, 1.381331674, 1.381331674, 1.381331674], degree=2, weights=[1, 0.868170932, 1]))
            Line((2.270445819, 1.457976694), (2.176824731, 1.457976694))
            add(Edge.make_bspline(
                [(2.176824731, 1.457976694), (0.591167883, 1.457976694), (0.59116787, 0.206821629)],
                knots=[4.81203319, 4.81203319, 4.81203319, 6.344970318, 6.344970318, 6.344970318], degree=2, weights=[1, 0.720364545, 1]))
            Line((0.59116787, 0.206821629), (0.59116787, 0.076691364))
            add(Edge.make_bspline(
                [(0.59116787, 0.076691364), (0.59116787, -1.174463735), (2.176824762, -1.174463712)],
                knots=[3.079807634, 3.079807634, 3.079807634, 4.61274479, 4.61274479, 4.61274479], degree=2, weights=[1, 0.720364535, 1]))
            Line((2.176824762, -1.174463712), (2.270445785, -1.174463712))
            add(Edge.make_bspline(
                [(2.270445785, -1.174463712), (3.213247257, -1.174463712), (3.631544819, -0.533329339)],
                knots=[1.760260959, 1.760260959, 1.760260959, 2.798844261, 2.798844261, 2.798844261], degree=2, weights=[1, 0.868170926, 1]))
            ThreePointArc((3.631544819, -0.533329339), (3.705294913, -0.414226505), (3.763958884, -0.287013692))
            ThreePointArc((3.763958884, -0.287013692), (3.775551871, -0.238690378), (3.773789763, -0.189027163))
            ThreePointArc((3.773789763, -0.189027163), (3.761785213, -0.168104183), (3.739125215, -0.159833461))
            Line((3.739125215, -0.159833461), (2.807816466, -0.159833461))
            ThreePointArc((2.807816466, -0.159833461), (2.770048636, -0.17183426), (2.746135097, -0.203434431))
            add(Edge.make_bspline(
                [(2.249643518, -0.574317984), (2.614751429, -0.574677188), (2.746135097, -0.203434431)],
                knots=[5.955155363, 5.955155363, 5.955155363, 7.020735544, 7.020735544, 7.020735544], degree=2, weights=[1, 0.86139323, 1]))
            add(Edge.make_bspline(
                [(2.189850362, 0.858318186), (1.567760628, 0.826860552), (1.597746498, 0.108403064), (1.627732367, -0.610054424), (2.249643518, -0.574317984)],
                knots=[3.181025595, 3.181025595, 3.181025595, 4.754799698, 4.754799698, 6.328573801, 6.328573801, 6.328573801], degree=2, weights=[1, 0.706053195, 1, 0.706053195, 1]))
            add(Edge.make_bspline(
                [(2.746135097, 0.490811684), (2.599896276, 0.904029734), (2.189850362, 0.858318186)],
                knots=[2.404042417, 2.404042417, 2.404042417, 3.565685694, 3.565685694, 3.565685694], degree=2, weights=[1, 0.83601209, 1]))
            ThreePointArc((2.746135097, 0.490811684), (2.770048652, 0.459211502), (2.807816498, 0.447210694))
        make_face()
    extrude(amount=CUT_EXTRUDE3_DEPTH, mode=Mode.SUBTRACT)


solid = part.part
